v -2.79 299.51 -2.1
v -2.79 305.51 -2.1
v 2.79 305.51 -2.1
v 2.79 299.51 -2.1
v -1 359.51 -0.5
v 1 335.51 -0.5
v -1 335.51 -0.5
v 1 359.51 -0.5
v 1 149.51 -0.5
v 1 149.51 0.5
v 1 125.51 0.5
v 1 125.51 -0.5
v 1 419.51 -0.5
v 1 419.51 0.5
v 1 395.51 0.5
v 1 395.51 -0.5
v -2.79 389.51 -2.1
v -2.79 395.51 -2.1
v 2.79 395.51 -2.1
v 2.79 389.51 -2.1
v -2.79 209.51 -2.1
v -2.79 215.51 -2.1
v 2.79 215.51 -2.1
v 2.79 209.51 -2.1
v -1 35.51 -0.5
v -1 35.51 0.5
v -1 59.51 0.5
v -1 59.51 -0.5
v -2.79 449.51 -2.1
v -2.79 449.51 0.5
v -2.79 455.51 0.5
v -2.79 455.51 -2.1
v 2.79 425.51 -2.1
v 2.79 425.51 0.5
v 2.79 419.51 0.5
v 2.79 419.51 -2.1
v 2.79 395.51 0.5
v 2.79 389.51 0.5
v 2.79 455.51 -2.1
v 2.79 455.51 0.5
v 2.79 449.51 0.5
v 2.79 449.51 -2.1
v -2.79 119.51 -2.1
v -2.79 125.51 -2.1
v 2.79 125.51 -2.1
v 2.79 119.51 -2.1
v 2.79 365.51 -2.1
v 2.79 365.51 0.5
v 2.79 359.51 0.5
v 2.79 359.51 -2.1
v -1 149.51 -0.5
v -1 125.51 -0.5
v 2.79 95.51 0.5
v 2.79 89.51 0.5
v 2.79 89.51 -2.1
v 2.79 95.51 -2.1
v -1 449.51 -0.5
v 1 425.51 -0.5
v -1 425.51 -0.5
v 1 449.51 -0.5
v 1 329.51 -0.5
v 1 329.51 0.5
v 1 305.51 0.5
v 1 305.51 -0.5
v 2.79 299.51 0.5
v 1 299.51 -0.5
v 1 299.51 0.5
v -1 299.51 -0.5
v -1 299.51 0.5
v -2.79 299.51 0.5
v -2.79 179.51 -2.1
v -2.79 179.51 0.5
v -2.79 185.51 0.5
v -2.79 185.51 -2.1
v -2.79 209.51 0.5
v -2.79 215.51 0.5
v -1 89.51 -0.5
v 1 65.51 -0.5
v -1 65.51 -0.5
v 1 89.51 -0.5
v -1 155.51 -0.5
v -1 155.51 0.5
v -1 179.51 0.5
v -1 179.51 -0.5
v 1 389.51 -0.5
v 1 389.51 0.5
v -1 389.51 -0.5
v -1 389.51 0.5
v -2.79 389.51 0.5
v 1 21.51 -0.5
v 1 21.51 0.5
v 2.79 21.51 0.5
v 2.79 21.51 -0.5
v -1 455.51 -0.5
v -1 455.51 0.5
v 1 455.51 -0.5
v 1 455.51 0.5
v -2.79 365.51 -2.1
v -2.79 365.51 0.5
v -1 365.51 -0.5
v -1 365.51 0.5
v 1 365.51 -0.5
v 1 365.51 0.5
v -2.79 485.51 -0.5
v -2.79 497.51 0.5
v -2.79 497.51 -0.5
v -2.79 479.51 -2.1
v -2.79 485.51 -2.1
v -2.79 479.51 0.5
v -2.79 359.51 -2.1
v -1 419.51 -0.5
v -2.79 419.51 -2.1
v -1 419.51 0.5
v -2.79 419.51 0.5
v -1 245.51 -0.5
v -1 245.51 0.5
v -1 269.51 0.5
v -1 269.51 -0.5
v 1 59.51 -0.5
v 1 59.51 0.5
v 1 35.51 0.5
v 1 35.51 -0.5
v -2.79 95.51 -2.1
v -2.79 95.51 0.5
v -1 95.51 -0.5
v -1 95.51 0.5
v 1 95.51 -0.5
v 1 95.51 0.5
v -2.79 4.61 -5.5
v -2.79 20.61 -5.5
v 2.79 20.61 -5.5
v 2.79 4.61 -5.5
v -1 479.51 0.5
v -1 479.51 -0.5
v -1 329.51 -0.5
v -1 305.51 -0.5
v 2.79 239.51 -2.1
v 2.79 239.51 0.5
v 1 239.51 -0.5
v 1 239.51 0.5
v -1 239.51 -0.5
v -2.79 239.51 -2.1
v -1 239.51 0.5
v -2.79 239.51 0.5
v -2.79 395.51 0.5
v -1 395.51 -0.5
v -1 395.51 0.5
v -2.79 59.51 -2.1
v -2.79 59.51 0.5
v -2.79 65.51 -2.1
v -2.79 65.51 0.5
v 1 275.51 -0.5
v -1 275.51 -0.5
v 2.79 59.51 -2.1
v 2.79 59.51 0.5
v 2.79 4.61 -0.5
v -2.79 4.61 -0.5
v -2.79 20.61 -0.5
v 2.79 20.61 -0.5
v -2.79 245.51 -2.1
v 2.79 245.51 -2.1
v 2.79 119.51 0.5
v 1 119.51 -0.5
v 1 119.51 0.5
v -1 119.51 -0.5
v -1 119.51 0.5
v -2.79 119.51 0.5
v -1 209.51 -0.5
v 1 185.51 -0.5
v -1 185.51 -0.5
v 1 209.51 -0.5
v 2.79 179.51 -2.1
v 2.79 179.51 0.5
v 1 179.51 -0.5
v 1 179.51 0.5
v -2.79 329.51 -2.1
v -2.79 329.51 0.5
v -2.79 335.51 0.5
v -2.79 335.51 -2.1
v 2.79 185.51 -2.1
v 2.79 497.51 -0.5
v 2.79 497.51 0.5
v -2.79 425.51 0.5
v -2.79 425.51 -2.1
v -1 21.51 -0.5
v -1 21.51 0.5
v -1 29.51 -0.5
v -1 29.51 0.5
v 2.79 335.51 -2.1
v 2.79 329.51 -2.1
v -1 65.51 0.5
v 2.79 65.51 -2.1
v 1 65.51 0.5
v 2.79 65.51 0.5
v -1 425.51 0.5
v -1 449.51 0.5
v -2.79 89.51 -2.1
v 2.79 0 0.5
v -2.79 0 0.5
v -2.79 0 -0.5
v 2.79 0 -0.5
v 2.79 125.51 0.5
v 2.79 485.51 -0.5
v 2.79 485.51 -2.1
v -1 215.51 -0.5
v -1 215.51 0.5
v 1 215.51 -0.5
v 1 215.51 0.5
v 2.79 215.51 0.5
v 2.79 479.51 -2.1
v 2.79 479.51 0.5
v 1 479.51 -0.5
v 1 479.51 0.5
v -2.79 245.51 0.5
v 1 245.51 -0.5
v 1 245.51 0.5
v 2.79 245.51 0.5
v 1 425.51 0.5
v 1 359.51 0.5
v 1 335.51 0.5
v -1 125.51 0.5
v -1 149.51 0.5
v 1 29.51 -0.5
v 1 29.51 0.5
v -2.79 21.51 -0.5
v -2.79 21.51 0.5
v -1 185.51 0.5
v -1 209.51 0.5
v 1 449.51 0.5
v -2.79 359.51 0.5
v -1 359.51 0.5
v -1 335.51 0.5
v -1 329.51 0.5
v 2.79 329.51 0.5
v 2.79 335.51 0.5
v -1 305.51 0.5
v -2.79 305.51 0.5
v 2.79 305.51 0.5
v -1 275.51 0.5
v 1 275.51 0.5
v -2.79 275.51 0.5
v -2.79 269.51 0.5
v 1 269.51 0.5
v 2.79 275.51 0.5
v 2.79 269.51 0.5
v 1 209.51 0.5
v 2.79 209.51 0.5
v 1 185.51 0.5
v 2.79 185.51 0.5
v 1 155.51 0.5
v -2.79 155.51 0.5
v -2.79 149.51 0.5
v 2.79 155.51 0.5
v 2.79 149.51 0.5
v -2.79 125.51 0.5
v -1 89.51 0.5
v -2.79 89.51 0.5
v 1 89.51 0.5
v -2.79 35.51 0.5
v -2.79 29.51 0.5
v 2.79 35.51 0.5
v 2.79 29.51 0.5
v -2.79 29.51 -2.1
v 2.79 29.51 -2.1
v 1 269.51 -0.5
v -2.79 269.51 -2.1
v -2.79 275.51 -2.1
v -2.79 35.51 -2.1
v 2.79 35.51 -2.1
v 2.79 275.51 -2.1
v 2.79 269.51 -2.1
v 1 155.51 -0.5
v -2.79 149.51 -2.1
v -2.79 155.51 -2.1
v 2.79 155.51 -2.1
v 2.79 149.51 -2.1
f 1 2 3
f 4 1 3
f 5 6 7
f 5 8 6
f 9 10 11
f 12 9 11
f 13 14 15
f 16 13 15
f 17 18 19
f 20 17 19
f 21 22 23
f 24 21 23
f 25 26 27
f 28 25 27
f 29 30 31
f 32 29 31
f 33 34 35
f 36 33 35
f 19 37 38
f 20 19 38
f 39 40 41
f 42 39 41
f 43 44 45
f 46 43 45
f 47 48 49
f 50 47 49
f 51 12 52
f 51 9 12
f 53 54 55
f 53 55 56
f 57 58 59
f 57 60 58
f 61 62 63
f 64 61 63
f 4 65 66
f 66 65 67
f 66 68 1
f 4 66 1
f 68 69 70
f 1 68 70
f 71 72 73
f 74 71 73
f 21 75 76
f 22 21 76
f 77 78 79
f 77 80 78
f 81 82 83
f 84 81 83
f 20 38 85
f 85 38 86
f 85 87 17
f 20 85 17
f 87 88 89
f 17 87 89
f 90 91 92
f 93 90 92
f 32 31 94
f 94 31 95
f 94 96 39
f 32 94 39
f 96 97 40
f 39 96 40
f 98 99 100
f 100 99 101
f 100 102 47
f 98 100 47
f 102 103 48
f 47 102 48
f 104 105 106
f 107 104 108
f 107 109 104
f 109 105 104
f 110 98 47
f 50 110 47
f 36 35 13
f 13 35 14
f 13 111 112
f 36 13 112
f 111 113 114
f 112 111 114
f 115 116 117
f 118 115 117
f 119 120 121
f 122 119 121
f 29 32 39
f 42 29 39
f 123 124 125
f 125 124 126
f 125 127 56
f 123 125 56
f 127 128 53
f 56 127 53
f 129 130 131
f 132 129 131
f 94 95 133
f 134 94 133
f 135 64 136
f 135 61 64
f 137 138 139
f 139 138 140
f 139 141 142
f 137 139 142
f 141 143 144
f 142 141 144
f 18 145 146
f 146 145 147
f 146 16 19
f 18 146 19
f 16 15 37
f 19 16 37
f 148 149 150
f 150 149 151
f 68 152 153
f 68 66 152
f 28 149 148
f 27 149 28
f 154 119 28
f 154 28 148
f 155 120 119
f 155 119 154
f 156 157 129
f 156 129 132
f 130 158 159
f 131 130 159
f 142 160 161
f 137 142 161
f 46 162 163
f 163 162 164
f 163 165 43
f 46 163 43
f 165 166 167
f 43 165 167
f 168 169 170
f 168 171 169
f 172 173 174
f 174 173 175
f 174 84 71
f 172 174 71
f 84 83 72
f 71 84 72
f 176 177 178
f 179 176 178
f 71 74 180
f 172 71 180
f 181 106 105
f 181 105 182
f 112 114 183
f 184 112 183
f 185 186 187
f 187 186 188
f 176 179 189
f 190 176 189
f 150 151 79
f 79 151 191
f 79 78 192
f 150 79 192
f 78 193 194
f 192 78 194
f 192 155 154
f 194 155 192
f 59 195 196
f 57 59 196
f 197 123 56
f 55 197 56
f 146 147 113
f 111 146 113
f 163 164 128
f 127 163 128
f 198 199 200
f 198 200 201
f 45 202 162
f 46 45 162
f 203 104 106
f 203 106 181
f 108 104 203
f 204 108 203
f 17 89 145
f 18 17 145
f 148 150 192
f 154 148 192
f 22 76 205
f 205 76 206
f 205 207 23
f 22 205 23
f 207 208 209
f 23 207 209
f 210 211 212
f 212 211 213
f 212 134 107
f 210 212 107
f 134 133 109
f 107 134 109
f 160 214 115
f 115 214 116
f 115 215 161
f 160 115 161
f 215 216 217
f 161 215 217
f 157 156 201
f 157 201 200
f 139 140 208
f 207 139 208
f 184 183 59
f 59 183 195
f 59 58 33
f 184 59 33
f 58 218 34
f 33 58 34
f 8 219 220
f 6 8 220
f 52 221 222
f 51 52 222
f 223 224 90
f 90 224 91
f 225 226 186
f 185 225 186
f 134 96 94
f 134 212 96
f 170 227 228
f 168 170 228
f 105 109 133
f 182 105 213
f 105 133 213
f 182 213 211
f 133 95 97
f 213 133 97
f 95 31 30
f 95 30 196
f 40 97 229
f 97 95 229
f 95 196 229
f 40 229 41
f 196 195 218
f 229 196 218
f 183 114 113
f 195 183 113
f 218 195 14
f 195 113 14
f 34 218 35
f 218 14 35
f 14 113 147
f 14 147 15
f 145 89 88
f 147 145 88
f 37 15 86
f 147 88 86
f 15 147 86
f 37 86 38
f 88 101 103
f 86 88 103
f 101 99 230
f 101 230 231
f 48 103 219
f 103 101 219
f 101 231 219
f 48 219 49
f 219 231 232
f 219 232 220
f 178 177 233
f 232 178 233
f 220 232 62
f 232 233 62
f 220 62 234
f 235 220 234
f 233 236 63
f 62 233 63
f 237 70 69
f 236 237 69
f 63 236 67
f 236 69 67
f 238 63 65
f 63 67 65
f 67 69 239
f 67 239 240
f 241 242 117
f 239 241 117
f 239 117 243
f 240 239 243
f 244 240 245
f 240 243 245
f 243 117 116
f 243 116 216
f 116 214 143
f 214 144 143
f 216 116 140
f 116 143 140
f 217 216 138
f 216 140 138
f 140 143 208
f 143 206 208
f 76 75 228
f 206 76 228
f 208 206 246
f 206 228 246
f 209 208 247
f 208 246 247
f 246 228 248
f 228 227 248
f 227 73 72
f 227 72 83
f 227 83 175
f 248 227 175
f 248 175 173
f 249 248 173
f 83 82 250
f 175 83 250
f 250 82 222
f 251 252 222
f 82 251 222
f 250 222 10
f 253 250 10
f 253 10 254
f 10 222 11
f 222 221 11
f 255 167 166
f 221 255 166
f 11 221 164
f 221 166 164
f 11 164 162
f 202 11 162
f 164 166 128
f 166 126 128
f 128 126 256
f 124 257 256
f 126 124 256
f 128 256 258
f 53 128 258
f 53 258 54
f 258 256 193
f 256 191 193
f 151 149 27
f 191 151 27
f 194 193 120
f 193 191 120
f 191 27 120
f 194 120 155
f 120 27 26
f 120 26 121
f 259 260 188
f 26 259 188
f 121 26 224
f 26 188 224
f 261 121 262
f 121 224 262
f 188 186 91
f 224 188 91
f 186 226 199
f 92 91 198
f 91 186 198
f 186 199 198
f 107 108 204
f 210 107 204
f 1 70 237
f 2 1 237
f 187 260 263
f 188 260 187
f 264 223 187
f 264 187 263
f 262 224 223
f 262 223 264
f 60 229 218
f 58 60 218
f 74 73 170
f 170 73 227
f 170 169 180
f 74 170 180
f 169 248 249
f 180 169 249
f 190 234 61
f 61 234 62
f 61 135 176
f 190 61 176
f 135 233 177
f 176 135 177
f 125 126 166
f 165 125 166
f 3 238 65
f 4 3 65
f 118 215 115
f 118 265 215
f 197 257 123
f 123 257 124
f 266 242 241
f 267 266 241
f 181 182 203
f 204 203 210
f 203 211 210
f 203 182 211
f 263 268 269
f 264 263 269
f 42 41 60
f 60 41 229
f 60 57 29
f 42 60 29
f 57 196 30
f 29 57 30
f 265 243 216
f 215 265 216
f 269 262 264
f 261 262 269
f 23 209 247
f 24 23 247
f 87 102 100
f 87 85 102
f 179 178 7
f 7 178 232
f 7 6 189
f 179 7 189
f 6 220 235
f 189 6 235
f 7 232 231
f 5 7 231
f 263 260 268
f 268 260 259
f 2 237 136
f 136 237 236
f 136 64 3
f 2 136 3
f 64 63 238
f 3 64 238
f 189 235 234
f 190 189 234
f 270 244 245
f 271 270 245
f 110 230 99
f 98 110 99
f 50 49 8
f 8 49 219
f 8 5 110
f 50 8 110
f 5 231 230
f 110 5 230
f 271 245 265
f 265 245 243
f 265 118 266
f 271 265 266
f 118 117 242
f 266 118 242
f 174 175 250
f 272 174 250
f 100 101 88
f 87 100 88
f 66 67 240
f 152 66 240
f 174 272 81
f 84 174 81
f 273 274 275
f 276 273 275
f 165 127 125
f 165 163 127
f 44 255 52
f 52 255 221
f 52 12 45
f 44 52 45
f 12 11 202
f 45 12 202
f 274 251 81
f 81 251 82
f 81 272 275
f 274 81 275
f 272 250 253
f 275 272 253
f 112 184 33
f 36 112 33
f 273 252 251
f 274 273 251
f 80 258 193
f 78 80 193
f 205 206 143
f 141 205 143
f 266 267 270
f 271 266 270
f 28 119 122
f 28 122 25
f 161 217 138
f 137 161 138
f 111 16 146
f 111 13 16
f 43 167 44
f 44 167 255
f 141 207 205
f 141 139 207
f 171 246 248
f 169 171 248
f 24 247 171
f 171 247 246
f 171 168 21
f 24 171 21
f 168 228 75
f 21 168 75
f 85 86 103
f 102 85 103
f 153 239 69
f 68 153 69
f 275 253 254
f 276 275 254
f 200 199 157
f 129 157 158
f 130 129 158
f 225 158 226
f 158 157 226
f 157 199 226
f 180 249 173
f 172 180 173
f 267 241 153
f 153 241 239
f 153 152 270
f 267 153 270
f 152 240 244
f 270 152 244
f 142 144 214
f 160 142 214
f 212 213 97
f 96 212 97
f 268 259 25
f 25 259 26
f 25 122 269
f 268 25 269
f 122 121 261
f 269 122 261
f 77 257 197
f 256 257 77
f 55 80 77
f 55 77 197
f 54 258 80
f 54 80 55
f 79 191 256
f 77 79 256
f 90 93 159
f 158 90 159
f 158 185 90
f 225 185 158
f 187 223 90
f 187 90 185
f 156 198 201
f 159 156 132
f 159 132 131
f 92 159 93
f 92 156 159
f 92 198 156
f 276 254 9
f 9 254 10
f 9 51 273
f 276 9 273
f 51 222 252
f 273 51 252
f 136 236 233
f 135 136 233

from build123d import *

# Parameters (mm, degrees)
SKETCH2_W           = 5.58
SKETCH2_H           = 21.51
BOSS_EXTRUDE1_DEPTH = 0.5
BOSS_EXTRUDE2_DEPTH = 0.5
SKETCH4_W           = 5.58
SKETCH4_H           = 6
BOSS_EXTRUDE3_DEPTH = 2.6
LPATTERN1_COUNT     = 16
LPATTERN1_PITCH     = 30
SKETCH5_W           = 5.58
SKETCH5_H           = 1
BOSS_EXTRUDE4_DEPTH = 12
SKETCH9_W           = 5.58
SKETCH9_H           = 16
BOSS_EXTRUDE6_DEPTH = 5


with BuildPart() as part:
    # Sketch2 → Boss-Extrude1 (new body, symmetric)
    with BuildSketch(Plane.XY):
        with Locations((0, 10.755)):
            Rectangle(SKETCH2_W, SKETCH2_H)
    extrude(amount=BOSS_EXTRUDE1_DEPTH, both=True)

    # Sketch3 → Boss-Extrude2 (add, symmetric)
    with BuildSketch(Plane.XY):
        Polygon((-2.79, 35.51), (2.79, 35.51), (2.79, 29.51), (1, 29.51), (1, 4.51), (-1, 4.51), (-1, 29.51), (-2.79, 29.51), align=None)
    boss_extrude2 = extrude(amount=BOSS_EXTRUDE2_DEPTH, both=True)

    # Sketch4 → Boss-Extrude3 (add)
    with BuildSketch(Plane.XY.offset(0.5)):
        with Locations((0, 32.51)):
            Rectangle(SKETCH4_W, SKETCH4_H)
    boss_extrude3 = extrude(amount=-BOSS_EXTRUDE3_DEPTH)

    # LPattern1: Boss-Extrude2, Boss-Extrude3 ×16
    with Locations(*[(0, i * LPATTERN1_PITCH, 0) for i in range(1, LPATTERN1_COUNT)]):
        add(boss_extrude2)
        add(boss_extrude3)

    # Sketch5 → Boss-Extrude4 (add)
    with BuildSketch(Plane(origin=(0, 485.51, 0), x_dir=(1, 0, 0), z_dir=(0, 1, 0))):
        Rectangle(SKETCH5_W, SKETCH5_H)
    extrude(amount=BOSS_EXTRUDE4_DEPTH)

    # Sketch9 → Boss-Extrude6 (add)
    with BuildSketch(Plane.XY.offset(-0.5)):
        with Locations((0, 12.61)):
            Rectangle(SKETCH9_W, SKETCH9_H)
    extrude(amount=-BOSS_EXTRUDE6_DEPTH)


solid = part.part
